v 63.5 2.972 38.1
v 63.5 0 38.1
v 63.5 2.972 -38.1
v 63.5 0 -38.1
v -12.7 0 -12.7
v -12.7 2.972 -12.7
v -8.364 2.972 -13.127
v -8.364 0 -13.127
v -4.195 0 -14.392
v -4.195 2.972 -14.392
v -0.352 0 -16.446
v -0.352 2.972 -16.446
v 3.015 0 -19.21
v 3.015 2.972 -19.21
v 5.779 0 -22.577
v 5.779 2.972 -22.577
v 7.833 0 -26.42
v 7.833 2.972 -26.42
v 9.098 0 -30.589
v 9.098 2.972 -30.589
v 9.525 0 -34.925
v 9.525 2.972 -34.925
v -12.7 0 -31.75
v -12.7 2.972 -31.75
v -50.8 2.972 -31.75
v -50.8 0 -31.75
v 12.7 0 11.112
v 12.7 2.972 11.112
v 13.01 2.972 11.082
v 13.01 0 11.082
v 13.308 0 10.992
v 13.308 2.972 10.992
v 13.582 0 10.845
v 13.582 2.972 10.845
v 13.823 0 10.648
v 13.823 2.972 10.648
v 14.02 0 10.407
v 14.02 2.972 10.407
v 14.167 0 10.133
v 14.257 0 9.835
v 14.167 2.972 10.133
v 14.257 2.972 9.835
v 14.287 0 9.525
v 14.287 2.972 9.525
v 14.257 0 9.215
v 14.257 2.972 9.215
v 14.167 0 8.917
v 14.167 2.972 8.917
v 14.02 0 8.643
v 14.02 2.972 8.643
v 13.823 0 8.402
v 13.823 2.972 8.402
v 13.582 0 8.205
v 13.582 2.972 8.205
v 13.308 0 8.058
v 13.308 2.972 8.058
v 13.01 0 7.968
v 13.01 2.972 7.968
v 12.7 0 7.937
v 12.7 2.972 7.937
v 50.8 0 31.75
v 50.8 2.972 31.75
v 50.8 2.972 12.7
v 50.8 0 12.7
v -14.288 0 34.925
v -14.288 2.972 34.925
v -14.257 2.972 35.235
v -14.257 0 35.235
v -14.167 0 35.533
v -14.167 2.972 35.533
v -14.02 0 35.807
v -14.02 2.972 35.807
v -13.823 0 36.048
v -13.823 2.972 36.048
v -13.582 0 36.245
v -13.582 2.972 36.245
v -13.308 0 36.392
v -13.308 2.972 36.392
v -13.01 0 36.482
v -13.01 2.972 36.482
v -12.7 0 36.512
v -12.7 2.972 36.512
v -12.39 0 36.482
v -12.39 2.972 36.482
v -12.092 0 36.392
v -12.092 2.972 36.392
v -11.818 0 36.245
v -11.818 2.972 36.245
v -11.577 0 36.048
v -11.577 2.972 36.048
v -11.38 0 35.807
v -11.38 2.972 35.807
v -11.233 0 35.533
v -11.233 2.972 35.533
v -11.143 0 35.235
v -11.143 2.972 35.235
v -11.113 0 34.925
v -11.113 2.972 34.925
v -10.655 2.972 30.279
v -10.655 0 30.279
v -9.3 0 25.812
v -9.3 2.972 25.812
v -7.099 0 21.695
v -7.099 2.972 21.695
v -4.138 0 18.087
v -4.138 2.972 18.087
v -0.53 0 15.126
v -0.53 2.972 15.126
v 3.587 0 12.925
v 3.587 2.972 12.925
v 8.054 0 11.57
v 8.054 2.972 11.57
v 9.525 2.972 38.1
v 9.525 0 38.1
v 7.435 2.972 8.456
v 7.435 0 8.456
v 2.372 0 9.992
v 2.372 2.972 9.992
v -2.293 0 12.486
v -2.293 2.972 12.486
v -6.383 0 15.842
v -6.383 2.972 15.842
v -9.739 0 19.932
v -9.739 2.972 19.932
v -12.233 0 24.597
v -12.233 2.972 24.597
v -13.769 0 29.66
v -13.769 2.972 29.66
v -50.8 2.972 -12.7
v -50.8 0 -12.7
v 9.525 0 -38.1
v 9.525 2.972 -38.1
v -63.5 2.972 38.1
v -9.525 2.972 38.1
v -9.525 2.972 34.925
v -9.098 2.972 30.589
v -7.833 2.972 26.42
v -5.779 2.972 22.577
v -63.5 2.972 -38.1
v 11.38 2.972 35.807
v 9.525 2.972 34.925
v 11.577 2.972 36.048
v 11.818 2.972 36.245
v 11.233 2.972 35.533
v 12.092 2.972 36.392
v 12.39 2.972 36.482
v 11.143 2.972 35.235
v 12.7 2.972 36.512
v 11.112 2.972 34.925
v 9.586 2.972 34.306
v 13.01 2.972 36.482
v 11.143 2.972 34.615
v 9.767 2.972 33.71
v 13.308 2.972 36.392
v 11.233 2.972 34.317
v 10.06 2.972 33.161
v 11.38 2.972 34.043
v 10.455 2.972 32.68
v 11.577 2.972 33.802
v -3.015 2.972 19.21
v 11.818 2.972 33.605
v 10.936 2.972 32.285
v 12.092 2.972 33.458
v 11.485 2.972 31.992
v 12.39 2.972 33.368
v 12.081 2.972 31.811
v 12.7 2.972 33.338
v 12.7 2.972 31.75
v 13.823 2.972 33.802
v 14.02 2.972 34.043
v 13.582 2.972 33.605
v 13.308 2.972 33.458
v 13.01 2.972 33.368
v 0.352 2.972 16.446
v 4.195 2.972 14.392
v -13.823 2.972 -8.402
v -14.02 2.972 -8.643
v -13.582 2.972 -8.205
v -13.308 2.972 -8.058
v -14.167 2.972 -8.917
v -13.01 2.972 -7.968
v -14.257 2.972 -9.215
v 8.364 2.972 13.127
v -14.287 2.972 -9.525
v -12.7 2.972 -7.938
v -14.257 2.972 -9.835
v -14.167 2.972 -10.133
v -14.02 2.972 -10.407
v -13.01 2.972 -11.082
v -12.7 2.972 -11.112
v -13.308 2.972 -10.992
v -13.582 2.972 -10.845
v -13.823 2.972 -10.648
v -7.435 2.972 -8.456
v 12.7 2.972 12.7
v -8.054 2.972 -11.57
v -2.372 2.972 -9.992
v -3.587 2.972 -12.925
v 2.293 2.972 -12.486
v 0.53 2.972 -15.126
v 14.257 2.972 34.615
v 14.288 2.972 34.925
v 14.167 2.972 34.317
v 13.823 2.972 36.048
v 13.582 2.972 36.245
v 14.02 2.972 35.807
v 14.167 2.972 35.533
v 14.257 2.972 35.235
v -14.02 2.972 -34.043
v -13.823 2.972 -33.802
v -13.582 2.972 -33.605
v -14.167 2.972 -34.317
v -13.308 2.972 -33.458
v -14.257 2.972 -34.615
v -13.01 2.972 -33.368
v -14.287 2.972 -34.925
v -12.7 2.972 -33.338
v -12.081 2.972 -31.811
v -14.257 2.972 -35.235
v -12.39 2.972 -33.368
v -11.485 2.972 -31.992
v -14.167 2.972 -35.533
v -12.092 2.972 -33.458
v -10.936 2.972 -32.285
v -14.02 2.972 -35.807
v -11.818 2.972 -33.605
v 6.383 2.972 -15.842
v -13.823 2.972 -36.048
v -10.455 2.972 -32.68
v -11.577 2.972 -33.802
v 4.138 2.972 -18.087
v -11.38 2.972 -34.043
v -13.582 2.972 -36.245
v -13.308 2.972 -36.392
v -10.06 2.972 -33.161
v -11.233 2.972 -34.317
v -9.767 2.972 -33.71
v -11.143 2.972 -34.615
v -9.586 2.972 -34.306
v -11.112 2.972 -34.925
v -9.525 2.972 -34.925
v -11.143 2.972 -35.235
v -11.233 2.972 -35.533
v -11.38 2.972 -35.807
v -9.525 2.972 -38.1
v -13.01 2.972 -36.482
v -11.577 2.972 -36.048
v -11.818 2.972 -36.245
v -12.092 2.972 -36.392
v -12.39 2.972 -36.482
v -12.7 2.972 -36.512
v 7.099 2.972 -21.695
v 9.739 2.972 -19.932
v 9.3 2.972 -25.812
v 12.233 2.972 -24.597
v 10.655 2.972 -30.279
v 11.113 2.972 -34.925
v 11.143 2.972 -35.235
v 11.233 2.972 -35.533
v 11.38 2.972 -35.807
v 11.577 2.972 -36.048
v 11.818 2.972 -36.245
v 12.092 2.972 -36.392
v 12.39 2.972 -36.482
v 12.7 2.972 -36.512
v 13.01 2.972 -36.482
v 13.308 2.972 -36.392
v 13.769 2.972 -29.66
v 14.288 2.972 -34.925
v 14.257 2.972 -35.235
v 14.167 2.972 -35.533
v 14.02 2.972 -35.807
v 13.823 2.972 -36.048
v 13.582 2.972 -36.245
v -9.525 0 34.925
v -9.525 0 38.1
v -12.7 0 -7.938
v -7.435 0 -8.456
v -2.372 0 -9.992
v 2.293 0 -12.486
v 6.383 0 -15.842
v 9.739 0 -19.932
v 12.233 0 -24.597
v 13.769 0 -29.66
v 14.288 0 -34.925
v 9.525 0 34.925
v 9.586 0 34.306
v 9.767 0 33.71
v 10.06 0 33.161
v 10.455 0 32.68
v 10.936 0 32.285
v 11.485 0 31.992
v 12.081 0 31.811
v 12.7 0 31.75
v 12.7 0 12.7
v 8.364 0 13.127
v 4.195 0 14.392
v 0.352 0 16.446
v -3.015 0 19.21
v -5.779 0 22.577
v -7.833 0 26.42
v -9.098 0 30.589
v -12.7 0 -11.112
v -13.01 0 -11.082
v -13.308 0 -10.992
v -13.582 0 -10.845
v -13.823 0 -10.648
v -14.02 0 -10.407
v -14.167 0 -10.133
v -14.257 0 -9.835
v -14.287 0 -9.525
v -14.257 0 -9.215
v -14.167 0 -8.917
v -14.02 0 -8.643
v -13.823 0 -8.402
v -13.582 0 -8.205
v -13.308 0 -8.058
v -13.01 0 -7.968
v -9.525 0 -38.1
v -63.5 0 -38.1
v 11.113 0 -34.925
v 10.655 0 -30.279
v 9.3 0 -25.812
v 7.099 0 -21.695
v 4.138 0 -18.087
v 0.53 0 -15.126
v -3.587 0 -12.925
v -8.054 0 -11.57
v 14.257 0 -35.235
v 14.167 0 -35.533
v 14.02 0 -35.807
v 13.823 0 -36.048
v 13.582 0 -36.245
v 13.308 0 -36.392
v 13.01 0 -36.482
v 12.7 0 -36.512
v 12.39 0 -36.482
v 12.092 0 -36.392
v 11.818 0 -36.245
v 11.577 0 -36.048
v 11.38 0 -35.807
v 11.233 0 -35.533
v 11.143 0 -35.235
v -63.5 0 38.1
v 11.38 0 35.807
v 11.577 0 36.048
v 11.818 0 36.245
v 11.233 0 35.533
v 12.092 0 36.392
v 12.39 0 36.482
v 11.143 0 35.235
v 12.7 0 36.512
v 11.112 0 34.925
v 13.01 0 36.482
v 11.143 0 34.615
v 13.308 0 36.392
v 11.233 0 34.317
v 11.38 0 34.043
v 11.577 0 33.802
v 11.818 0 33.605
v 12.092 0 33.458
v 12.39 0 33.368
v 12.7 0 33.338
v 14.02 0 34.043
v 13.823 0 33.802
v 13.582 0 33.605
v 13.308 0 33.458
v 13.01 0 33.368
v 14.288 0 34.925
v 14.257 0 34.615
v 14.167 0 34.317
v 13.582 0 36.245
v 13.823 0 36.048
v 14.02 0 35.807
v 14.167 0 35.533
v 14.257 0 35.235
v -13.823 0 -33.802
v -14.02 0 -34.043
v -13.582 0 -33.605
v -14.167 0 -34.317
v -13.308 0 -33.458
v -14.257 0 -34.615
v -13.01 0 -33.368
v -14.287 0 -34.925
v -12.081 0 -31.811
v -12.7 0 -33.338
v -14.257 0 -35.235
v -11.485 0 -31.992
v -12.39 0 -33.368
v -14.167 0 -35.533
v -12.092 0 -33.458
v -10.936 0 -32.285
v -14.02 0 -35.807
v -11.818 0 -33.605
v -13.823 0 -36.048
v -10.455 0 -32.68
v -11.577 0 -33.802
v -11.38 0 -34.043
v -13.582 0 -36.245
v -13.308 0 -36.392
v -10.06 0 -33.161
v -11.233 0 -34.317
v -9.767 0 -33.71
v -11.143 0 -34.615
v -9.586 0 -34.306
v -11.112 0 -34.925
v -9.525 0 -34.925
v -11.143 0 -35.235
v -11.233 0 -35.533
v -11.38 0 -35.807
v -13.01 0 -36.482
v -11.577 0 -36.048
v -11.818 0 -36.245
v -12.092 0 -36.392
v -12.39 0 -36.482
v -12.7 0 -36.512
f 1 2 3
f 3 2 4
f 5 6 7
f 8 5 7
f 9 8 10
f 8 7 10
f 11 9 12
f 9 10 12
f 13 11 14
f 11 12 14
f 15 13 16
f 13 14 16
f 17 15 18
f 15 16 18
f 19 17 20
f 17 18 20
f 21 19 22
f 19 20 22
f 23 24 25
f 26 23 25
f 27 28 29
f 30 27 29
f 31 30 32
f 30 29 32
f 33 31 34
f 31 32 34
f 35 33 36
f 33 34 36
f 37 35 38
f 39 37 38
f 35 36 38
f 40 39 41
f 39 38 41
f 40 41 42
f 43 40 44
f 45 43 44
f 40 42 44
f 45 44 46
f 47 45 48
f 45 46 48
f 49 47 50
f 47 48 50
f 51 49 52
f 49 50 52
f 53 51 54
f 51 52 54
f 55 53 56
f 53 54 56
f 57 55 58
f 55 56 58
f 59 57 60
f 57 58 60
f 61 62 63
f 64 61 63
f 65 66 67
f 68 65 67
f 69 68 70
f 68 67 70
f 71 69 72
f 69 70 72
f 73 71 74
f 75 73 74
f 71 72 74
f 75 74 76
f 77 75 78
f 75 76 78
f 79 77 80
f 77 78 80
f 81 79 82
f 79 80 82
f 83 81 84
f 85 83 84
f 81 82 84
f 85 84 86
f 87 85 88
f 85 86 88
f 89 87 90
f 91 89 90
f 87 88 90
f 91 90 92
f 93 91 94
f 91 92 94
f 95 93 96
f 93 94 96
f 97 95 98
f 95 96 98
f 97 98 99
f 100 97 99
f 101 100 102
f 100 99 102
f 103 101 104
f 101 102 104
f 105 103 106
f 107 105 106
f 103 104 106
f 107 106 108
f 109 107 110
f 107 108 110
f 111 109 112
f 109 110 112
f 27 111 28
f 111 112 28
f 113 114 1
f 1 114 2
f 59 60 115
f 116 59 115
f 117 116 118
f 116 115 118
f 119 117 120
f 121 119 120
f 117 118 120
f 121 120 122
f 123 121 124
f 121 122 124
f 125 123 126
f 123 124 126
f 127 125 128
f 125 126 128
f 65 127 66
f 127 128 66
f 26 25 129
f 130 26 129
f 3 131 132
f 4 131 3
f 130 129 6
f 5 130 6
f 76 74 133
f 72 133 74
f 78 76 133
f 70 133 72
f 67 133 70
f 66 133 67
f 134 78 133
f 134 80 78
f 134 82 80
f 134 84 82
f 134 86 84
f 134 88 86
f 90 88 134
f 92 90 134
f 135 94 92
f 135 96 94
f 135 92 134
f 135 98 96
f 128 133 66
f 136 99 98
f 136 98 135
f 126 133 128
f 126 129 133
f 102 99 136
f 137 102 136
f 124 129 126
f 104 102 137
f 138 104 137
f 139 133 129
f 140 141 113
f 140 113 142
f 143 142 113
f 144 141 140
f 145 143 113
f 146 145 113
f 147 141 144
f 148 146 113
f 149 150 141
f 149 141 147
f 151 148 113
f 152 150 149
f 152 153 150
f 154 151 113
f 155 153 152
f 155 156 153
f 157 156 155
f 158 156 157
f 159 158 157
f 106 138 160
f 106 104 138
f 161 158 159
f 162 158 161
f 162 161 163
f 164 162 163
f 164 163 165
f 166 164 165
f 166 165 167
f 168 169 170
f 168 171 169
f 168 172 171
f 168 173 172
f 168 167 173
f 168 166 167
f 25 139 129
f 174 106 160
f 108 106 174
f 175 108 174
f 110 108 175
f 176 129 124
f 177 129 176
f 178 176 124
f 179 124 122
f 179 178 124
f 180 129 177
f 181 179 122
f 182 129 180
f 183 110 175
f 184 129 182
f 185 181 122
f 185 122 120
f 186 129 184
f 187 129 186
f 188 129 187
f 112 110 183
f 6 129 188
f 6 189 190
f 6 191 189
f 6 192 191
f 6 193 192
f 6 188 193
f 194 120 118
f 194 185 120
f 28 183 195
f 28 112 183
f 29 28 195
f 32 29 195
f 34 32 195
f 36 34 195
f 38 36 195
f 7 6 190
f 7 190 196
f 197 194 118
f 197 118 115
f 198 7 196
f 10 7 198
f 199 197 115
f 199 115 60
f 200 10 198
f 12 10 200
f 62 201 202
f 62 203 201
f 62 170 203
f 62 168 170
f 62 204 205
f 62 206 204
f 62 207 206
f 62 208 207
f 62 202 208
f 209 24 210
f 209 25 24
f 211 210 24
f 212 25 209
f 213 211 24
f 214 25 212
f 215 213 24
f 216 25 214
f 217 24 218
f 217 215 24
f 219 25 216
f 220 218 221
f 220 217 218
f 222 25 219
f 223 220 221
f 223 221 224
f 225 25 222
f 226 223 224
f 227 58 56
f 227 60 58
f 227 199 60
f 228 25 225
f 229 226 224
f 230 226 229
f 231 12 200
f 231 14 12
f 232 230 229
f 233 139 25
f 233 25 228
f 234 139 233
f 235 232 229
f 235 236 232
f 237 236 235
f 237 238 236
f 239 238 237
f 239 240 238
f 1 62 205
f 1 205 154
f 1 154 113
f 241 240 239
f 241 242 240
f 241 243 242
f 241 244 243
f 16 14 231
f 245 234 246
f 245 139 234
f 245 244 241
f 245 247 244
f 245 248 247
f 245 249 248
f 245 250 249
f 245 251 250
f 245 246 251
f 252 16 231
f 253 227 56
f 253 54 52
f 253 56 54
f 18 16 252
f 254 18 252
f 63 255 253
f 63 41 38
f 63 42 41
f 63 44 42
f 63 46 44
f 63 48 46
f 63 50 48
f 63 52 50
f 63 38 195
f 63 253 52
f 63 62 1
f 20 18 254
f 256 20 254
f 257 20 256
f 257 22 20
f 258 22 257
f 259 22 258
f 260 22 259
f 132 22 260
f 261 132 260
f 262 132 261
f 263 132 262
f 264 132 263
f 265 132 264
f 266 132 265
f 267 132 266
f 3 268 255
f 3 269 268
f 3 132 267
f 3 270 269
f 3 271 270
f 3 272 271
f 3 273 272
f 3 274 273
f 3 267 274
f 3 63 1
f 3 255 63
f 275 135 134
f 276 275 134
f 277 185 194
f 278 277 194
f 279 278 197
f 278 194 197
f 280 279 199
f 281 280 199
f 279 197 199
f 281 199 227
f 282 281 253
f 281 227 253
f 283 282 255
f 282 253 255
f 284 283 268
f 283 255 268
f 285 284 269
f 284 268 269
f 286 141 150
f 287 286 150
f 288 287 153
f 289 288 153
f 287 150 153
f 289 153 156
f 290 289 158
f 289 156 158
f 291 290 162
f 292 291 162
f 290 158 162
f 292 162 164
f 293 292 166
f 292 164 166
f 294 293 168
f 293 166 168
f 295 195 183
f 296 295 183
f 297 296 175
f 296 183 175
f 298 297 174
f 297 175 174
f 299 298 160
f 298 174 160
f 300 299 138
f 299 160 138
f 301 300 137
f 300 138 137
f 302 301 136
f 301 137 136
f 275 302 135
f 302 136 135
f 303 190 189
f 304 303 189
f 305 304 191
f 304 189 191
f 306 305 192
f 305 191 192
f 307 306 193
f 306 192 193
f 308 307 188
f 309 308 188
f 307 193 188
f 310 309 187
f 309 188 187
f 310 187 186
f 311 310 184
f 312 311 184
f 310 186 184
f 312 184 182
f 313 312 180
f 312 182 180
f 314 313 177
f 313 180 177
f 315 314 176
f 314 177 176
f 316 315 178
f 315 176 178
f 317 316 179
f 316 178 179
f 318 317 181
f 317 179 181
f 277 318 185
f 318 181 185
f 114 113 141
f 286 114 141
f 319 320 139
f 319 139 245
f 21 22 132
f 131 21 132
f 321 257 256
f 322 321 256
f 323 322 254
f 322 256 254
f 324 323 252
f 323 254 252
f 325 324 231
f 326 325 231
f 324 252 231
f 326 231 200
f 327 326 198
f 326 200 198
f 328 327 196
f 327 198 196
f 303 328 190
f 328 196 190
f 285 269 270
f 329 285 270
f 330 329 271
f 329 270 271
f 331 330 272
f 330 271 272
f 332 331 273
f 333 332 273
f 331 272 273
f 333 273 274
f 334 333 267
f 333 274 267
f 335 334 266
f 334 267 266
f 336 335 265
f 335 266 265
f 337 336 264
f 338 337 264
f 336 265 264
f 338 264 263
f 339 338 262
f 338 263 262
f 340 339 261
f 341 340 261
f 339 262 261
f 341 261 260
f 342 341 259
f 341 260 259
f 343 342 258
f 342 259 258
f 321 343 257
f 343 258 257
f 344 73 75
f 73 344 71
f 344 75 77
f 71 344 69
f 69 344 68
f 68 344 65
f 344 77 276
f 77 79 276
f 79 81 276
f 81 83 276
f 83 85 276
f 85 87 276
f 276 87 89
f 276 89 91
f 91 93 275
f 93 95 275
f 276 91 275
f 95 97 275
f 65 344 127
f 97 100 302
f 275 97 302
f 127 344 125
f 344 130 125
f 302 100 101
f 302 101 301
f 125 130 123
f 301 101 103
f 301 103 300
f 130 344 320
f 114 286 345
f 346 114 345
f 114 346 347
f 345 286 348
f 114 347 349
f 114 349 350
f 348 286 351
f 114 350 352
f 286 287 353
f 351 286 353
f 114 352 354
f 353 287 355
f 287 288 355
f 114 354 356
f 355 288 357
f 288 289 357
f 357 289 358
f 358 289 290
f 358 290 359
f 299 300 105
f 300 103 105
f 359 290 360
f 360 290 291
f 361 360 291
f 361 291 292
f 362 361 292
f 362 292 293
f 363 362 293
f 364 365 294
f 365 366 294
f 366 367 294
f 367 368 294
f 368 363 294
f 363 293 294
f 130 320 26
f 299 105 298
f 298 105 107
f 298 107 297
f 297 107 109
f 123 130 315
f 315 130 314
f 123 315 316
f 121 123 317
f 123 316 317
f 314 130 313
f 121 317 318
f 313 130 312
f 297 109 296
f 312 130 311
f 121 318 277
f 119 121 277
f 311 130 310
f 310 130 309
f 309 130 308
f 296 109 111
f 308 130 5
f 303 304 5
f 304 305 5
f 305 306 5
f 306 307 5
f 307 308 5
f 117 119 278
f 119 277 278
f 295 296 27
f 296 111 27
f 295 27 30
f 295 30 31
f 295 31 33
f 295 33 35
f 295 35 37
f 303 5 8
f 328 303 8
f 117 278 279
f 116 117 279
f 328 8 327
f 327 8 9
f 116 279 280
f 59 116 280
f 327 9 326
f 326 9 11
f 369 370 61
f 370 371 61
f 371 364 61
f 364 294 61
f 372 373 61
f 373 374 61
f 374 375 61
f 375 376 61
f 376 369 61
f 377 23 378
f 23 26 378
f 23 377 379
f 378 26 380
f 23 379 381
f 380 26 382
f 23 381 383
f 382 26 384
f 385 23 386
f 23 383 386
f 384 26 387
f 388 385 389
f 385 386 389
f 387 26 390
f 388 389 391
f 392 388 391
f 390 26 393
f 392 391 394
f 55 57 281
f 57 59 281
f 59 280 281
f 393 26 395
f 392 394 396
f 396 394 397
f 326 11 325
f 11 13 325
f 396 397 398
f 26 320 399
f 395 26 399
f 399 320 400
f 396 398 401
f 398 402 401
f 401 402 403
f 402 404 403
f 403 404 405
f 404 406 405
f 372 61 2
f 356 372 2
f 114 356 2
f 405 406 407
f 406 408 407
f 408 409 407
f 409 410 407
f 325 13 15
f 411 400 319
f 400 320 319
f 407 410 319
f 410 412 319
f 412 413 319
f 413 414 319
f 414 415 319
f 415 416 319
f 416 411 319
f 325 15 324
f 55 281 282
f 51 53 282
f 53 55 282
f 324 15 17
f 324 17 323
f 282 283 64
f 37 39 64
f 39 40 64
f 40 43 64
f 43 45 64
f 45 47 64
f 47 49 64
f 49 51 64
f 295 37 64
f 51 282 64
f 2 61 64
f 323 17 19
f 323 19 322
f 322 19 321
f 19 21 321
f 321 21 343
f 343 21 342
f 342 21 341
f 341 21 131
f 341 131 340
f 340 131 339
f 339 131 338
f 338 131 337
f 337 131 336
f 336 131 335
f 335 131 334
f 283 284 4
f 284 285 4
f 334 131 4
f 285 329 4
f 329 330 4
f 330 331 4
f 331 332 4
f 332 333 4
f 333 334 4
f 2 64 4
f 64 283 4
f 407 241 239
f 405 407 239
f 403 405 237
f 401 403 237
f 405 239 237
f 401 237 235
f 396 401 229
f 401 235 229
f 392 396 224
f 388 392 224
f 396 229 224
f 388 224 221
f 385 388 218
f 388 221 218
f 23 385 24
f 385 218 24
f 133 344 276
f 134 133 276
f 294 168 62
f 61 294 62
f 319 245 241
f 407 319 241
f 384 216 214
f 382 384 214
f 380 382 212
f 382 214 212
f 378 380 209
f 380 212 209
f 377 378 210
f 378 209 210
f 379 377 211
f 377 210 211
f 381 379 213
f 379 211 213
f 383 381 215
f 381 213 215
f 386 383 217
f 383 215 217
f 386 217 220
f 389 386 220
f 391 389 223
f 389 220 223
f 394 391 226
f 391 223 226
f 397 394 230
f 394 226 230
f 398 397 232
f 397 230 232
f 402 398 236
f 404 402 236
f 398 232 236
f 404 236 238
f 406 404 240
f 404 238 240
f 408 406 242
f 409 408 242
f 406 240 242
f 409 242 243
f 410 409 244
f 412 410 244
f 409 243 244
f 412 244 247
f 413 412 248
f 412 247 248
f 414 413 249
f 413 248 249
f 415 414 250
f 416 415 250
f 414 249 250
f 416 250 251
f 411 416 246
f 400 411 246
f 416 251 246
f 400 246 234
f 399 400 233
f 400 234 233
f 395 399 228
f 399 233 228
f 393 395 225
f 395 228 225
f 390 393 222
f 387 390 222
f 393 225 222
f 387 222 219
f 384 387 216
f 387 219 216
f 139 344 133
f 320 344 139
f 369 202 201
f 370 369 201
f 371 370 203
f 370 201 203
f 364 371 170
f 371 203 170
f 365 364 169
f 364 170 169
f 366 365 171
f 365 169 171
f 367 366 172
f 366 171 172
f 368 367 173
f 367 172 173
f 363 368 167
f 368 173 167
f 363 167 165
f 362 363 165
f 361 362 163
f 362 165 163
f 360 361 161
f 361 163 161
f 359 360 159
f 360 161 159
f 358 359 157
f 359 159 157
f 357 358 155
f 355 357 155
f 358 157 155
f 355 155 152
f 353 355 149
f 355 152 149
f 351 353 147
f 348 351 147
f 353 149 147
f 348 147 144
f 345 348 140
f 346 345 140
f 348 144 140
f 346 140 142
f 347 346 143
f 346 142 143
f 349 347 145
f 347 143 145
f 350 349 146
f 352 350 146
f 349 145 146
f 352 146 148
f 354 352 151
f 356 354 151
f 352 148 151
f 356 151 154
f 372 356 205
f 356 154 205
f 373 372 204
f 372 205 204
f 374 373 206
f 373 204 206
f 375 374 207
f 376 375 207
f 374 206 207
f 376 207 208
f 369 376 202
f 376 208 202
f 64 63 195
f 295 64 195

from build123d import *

# Parameters (mm, degrees)
SKETCH2_W           = 127
SKETCH2_H           = 76.2
BOSS_EXTRUDE1_DEPTH = 2.9718
SKETCH3_R           = 1.5875
CUT_EXTRUDE1_DEPTH  = 2.9718
CIRPATTERN1_COUNT   = 2


with BuildPart() as part:
    # Sketch2 → Boss-Extrude1 (new body)
    with BuildSketch(Plane(origin=(0, 0, 0), x_dir=(1, 0, 0), z_dir=(0, 1, 0))):
        Rectangle(SKETCH2_W, SKETCH2_H)
    extrude(amount=BOSS_EXTRUDE1_DEPTH)

    # Sketch3 → Cut-Extrude1 (cut)
    with BuildSketch(Plane(origin=(0, 2.9718, 0), x_dir=(1, 0, 0), z_dir=(0, 1, 0))):
        with BuildLine():
            ThreePointArc((12.7, -12.7), (-3.015448212, -19.209551788), (-9.525, -34.925))
            Line((-9.525, -34.925), (-9.525, -38.1))
            Line((-9.525, -38.1), (9.525, -38.1))
            Line((9.525, -38.1), (9.525, -34.925))
            ThreePointArc((9.525, -34.925), (10.45493597, -32.67993597), (12.7, -31.75))
            Line((12.7, -31.75), (50.8, -31.75))
            Line((50.8, -31.75), (50.8, -12.7))
            Line((50.8, -12.7), (12.7, -12.7))
        make_face()
        with Locations((12.7, -34.925)):
            Circle(SKETCH3_R)
        with BuildLine():
            ThreePointArc((12.7, -7.9375), (-6.383044257, -15.841955743), (-14.2875, -34.925))
            ThreePointArc((-14.2875, -34.925), (-12.7, -36.5125), (-11.1125, -34.925))
            ThreePointArc((-11.1125, -34.925), (-4.137980227, -18.087019773), (12.7, -11.1125))
            ThreePointArc((12.7, -11.1125), (14.2875, -9.525), (12.7, -7.9375))
        make_face()
    cut_extrude1 = extrude(amount=-CUT_EXTRUDE1_DEPTH, mode=Mode.SUBTRACT)

    # CirPattern1: Cut-Extrude1 ×2 about axis
    cirpattern1_axis = Axis((0, -0.14859, 0), (0, 1, 0))
    for i in range(1, CIRPATTERN1_COUNT):
        add(cut_extrude1.rotate(cirpattern1_axis, i * 360 / CIRPATTERN1_COUNT), mode=Mode.SUBTRACT)


solid = part.part
